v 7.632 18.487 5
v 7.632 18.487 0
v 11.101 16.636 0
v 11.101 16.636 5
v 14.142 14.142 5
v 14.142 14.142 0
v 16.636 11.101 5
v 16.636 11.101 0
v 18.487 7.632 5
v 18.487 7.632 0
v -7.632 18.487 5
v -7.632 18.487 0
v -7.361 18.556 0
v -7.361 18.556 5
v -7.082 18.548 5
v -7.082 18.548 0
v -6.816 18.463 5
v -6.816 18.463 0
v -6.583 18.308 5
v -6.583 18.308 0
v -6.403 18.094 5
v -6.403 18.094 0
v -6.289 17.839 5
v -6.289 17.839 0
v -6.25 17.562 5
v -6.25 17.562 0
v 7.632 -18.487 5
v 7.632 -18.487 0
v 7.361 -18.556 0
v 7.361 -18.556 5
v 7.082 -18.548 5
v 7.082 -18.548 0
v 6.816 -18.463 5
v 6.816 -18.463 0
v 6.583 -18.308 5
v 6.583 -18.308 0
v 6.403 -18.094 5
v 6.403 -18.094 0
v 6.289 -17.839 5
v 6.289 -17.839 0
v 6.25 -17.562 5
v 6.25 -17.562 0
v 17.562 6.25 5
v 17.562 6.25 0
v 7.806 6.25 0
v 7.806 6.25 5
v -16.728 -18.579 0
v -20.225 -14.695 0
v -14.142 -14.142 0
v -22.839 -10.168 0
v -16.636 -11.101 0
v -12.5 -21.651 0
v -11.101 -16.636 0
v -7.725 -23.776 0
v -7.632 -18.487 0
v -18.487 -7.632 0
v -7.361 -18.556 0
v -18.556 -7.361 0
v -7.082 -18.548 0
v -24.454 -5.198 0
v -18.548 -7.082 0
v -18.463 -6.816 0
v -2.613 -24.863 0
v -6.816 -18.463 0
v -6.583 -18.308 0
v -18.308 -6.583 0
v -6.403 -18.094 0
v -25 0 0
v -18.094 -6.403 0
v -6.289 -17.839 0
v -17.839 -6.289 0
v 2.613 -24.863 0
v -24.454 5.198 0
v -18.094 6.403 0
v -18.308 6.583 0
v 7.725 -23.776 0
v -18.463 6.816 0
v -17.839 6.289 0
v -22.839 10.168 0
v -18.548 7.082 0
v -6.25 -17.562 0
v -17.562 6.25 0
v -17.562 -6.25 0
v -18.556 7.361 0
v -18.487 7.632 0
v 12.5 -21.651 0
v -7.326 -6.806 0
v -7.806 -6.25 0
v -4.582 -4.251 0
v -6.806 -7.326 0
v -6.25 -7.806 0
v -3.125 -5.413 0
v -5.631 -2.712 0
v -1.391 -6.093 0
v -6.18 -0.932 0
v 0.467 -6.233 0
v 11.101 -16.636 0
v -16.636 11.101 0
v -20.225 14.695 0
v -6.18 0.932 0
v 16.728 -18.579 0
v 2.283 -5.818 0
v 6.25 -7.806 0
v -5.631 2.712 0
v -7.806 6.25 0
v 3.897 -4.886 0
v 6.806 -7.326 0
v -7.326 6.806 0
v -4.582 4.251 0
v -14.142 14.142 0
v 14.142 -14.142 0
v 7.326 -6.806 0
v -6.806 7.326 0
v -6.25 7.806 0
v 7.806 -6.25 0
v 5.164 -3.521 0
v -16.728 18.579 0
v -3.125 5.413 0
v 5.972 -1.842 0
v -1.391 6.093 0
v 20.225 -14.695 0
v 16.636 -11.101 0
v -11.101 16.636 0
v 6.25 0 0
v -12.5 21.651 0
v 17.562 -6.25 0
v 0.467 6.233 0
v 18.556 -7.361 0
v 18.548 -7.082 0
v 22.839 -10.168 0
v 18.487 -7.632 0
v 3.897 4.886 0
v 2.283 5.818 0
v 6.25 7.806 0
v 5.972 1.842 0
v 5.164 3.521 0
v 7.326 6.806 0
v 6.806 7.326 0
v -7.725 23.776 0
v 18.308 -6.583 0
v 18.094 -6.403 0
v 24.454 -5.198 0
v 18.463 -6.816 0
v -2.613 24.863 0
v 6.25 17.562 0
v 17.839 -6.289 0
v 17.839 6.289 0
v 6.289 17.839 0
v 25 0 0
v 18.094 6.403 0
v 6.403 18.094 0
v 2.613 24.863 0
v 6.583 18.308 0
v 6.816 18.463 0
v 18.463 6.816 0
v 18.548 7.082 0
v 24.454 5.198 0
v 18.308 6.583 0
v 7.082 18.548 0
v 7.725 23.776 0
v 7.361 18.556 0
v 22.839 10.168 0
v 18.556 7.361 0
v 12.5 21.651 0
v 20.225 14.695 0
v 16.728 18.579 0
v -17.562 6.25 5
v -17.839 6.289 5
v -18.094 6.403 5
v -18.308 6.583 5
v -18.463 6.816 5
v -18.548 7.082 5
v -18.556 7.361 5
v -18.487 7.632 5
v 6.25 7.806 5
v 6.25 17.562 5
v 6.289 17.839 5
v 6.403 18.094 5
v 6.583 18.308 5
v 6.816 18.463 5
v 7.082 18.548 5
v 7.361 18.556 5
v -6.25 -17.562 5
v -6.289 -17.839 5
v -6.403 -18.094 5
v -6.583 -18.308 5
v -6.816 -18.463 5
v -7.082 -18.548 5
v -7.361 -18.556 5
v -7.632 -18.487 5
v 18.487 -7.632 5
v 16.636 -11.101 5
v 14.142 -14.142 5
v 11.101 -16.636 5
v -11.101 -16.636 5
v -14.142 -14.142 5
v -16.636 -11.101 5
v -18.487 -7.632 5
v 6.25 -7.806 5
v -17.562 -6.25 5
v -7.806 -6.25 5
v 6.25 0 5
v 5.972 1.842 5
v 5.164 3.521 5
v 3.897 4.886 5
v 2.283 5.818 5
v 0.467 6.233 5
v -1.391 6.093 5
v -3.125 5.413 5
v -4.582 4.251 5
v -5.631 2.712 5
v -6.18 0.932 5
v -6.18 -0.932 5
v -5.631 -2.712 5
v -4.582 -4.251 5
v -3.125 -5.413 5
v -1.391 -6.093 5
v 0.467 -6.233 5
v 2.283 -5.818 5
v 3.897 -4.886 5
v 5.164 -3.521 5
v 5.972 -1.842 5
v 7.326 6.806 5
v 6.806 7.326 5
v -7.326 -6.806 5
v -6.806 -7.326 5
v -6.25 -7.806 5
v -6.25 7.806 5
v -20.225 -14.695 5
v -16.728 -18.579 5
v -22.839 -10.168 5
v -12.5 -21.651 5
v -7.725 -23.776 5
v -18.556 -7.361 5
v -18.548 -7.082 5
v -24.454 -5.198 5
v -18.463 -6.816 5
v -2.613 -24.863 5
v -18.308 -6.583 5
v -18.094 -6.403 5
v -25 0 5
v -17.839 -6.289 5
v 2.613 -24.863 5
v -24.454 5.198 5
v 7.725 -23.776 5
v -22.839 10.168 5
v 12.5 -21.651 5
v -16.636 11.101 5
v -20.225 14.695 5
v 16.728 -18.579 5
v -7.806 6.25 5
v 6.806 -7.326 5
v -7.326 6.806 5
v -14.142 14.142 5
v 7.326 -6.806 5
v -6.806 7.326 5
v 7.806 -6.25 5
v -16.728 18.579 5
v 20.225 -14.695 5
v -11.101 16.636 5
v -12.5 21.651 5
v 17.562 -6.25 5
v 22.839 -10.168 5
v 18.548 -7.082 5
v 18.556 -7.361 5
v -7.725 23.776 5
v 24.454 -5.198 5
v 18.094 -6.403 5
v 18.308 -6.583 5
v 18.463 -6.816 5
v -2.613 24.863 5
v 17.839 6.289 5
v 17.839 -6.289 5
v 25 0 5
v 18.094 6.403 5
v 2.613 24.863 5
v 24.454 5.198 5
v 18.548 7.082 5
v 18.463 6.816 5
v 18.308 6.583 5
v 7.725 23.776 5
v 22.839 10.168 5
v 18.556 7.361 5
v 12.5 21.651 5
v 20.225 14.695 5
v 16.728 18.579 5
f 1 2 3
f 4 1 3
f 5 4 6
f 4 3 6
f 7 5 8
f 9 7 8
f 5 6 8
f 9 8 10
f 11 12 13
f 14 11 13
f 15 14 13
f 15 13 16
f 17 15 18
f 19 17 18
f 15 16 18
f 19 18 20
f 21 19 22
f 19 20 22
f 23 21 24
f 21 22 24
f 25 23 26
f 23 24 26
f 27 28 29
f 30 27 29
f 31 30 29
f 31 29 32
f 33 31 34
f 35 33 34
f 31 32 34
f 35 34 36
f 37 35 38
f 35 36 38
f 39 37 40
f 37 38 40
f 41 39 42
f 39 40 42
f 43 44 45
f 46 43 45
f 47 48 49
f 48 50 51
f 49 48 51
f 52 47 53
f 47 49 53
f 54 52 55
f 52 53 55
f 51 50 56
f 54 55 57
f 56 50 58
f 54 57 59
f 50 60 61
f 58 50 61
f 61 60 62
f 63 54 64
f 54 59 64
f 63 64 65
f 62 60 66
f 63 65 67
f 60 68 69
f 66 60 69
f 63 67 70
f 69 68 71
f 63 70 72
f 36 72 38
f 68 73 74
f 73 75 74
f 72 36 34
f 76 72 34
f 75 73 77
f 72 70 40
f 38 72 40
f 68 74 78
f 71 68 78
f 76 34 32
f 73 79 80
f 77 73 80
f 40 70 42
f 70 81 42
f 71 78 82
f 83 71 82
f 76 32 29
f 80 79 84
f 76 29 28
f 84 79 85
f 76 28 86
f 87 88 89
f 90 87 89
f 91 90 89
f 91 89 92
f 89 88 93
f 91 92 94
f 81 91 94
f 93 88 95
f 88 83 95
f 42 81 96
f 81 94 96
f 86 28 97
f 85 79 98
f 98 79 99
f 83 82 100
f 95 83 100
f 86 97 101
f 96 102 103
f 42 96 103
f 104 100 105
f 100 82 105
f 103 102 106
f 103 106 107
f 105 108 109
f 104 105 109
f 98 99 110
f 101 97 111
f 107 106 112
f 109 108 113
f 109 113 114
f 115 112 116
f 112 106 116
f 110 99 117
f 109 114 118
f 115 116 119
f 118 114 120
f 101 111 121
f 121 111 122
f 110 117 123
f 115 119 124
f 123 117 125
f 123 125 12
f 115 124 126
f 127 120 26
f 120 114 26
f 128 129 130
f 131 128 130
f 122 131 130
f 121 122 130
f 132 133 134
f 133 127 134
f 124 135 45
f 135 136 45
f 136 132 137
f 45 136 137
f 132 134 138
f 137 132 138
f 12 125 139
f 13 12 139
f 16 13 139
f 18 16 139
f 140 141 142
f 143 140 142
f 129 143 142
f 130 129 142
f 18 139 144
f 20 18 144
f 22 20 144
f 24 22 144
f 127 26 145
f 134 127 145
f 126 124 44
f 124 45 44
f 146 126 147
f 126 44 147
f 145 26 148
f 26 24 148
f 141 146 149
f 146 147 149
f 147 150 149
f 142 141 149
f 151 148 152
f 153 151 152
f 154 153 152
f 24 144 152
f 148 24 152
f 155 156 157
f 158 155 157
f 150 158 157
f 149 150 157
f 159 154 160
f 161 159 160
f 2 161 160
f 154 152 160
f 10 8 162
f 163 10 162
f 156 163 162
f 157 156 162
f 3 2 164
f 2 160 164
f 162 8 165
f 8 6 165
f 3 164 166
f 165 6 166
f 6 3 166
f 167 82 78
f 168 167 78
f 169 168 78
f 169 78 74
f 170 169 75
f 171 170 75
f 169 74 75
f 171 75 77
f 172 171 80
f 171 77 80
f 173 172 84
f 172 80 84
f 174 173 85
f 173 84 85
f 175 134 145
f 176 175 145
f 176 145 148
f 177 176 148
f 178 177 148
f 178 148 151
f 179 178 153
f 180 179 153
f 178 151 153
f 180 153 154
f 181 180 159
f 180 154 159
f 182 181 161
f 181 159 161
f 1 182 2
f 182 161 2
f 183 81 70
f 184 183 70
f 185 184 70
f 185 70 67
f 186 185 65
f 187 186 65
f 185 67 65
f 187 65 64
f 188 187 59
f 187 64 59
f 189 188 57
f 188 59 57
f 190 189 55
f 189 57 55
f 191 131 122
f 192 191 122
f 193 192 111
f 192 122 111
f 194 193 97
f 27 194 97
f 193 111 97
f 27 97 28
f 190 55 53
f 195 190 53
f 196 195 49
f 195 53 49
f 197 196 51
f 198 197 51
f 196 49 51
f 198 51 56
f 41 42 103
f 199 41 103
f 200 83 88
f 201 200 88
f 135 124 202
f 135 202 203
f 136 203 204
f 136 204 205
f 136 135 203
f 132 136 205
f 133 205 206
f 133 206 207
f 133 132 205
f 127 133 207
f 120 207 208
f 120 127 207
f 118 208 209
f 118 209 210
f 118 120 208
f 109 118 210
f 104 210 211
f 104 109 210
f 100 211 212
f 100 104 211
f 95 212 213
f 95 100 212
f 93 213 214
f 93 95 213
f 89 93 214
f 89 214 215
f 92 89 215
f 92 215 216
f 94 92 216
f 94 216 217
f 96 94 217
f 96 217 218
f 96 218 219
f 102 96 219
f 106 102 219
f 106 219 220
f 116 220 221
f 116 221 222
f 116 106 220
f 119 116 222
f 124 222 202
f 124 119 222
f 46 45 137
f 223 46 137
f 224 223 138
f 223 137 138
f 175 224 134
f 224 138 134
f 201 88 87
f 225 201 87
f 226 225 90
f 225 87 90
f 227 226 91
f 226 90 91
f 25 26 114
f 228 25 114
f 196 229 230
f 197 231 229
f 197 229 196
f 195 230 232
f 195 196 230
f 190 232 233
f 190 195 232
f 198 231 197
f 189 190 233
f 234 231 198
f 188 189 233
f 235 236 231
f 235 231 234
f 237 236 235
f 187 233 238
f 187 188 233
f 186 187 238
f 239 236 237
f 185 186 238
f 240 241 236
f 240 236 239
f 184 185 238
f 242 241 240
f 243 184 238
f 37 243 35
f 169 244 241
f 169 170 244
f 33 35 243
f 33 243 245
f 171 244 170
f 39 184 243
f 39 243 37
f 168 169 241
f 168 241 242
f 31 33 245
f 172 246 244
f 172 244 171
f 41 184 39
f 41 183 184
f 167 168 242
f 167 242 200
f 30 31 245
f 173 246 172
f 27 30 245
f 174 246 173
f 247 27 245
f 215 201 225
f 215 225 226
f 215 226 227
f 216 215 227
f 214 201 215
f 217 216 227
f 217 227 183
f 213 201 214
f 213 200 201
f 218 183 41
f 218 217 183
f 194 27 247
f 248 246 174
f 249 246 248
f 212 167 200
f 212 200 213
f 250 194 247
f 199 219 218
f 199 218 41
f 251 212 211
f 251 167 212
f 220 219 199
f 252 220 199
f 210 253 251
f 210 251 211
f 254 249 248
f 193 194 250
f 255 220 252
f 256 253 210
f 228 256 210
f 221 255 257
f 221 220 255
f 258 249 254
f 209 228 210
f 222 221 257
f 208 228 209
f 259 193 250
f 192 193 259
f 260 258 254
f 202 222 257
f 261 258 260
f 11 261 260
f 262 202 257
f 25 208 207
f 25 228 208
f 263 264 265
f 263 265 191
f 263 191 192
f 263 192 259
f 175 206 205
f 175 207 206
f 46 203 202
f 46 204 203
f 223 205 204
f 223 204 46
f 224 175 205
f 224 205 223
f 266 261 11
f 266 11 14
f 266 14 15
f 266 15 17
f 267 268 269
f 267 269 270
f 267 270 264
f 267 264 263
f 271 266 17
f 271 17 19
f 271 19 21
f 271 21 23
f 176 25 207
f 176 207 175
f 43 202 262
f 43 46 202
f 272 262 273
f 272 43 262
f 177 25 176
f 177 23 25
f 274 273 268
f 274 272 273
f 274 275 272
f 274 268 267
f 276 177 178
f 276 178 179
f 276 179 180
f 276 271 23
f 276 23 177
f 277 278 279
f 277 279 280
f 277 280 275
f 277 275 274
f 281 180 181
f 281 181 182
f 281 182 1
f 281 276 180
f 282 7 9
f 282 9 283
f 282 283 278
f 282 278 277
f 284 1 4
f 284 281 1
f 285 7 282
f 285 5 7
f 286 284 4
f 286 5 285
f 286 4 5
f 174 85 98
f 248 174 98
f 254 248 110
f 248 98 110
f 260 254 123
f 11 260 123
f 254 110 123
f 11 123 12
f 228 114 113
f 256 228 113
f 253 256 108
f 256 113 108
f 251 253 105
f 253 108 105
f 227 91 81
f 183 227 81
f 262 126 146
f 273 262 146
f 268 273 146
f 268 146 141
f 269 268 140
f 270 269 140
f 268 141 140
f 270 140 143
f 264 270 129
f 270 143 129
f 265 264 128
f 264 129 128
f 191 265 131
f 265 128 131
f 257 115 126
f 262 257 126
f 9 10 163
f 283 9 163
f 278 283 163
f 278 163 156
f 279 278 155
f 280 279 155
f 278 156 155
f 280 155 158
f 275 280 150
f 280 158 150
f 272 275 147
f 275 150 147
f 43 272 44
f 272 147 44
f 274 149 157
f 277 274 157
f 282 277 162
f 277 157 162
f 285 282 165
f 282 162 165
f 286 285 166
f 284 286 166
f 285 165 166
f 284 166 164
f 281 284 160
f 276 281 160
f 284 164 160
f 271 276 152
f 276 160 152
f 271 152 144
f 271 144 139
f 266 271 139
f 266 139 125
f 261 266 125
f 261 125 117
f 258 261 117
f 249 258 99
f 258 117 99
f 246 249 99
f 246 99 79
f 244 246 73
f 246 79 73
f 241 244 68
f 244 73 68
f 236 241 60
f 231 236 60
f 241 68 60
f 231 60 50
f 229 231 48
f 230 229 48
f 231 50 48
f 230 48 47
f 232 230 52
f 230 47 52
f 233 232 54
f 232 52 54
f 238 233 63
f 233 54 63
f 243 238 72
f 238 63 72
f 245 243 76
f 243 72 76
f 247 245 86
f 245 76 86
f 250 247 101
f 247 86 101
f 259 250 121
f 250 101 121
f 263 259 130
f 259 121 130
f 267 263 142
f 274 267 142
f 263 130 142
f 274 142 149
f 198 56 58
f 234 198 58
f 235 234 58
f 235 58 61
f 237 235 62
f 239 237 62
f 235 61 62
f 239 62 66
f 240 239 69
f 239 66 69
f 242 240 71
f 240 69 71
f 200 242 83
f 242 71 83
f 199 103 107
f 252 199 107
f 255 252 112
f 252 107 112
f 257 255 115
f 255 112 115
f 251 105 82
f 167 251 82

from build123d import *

# Parameters (mm, degrees)
SKETCH1_R           = 25
SKETCH1_R_2         = 10
SKETCH1_R_3         = 6.25
BOSS_EXTRUDE1_DEPTH = 5


with BuildPart() as part:
    # Sketch1 → Boss-Extrude1 (new body)
    # profile 1 of 2: a face of its own
    with BuildSketch(Plane.XY):
        Circle(SKETCH1_R)
        with BuildLine():
            Line((17.56238879, 6.25), (7.806247498, 6.25))
            ThreePointArc((7.806247498, 6.25), (9.43563657, 3.311912214), (10, 0))
            ThreePointArc((10, 0), (9.43563657, -3.311912214), (7.806247498, -6.25))
            Line((7.806247498, -6.25), (17.56238879, -6.25))
            ThreePointArc((17.56238879, -6.25), (18.393526247, -6.693932984), (18.486725042, -7.631578947))
            ThreePointArc((18.486725042, -7.631578947), (14.142135624, -14.142135624), (7.631578947, -18.486725042))
            ThreePointArc((7.631578947, -18.486725042), (6.693932984, -18.393526247), (6.25, -17.56238879))
            Line((6.25, -17.56238879), (6.25, -7.806247498))
            ThreePointArc((6.25, -7.806247498), (0, -10), (-6.25, -7.806247498))
            Line((-6.25, -7.806247498), (-6.25, -17.56238879))
            ThreePointArc((-6.25, -17.56238879), (-6.693932984, -18.393526247), (-7.631578947, -18.486725042))
            ThreePointArc((-7.631578947, -18.486725042), (-14.142135624, -14.142135624), (-18.486725042, -7.631578947))
            ThreePointArc((-18.486725042, -7.631578947), (-18.393526247, -6.693932984), (-17.56238879, -6.25))
            Line((-17.56238879, -6.25), (-7.806247498, -6.25))
            ThreePointArc((-7.806247498, -6.25), (-10, 0), (-7.806247498, 6.25))
            Line((-7.806247498, 6.25), (-17.56238879, 6.25))
            ThreePointArc((-17.56238879, 6.25), (-18.393526247, 6.693932984), (-18.486725042, 7.631578947))
            ThreePointArc((-18.486725042, 7.631578947), (-14.142135624, 14.142135624), (-7.631578947, 18.486725042))
            ThreePointArc((-7.631578947, 18.486725042), (-6.693932984, 18.393526247), (-6.25, 17.56238879))
            Line((-6.25, 17.56238879), (-6.25, 7.806247498))
            ThreePointArc((-6.25, 7.806247498), (0, 10), (6.25, 7.806247498))
            Line((6.25, 7.806247498), (6.25, 17.56238879))
            ThreePointArc((6.25, 17.56238879), (6.693932984, 18.393526247), (7.631578947, 18.486725042))
            ThreePointArc((7.631578947, 18.486725042), (14.142135624, 14.142135624), (18.486725042, 7.631578947))
            ThreePointArc((18.486725042, 7.631578947), (18.393526247, 6.693932984), (17.56238879, 6.25))
        make_face(mode=Mode.SUBTRACT)
    # profile 2 of 2: a face of its own
    with BuildSketch(Plane.XY):
        Circle(SKETCH1_R_2)
        Circle(SKETCH1_R_3, mode=Mode.SUBTRACT)
    extrude(amount=BOSS_EXTRUDE1_DEPTH)


solid = part.part
